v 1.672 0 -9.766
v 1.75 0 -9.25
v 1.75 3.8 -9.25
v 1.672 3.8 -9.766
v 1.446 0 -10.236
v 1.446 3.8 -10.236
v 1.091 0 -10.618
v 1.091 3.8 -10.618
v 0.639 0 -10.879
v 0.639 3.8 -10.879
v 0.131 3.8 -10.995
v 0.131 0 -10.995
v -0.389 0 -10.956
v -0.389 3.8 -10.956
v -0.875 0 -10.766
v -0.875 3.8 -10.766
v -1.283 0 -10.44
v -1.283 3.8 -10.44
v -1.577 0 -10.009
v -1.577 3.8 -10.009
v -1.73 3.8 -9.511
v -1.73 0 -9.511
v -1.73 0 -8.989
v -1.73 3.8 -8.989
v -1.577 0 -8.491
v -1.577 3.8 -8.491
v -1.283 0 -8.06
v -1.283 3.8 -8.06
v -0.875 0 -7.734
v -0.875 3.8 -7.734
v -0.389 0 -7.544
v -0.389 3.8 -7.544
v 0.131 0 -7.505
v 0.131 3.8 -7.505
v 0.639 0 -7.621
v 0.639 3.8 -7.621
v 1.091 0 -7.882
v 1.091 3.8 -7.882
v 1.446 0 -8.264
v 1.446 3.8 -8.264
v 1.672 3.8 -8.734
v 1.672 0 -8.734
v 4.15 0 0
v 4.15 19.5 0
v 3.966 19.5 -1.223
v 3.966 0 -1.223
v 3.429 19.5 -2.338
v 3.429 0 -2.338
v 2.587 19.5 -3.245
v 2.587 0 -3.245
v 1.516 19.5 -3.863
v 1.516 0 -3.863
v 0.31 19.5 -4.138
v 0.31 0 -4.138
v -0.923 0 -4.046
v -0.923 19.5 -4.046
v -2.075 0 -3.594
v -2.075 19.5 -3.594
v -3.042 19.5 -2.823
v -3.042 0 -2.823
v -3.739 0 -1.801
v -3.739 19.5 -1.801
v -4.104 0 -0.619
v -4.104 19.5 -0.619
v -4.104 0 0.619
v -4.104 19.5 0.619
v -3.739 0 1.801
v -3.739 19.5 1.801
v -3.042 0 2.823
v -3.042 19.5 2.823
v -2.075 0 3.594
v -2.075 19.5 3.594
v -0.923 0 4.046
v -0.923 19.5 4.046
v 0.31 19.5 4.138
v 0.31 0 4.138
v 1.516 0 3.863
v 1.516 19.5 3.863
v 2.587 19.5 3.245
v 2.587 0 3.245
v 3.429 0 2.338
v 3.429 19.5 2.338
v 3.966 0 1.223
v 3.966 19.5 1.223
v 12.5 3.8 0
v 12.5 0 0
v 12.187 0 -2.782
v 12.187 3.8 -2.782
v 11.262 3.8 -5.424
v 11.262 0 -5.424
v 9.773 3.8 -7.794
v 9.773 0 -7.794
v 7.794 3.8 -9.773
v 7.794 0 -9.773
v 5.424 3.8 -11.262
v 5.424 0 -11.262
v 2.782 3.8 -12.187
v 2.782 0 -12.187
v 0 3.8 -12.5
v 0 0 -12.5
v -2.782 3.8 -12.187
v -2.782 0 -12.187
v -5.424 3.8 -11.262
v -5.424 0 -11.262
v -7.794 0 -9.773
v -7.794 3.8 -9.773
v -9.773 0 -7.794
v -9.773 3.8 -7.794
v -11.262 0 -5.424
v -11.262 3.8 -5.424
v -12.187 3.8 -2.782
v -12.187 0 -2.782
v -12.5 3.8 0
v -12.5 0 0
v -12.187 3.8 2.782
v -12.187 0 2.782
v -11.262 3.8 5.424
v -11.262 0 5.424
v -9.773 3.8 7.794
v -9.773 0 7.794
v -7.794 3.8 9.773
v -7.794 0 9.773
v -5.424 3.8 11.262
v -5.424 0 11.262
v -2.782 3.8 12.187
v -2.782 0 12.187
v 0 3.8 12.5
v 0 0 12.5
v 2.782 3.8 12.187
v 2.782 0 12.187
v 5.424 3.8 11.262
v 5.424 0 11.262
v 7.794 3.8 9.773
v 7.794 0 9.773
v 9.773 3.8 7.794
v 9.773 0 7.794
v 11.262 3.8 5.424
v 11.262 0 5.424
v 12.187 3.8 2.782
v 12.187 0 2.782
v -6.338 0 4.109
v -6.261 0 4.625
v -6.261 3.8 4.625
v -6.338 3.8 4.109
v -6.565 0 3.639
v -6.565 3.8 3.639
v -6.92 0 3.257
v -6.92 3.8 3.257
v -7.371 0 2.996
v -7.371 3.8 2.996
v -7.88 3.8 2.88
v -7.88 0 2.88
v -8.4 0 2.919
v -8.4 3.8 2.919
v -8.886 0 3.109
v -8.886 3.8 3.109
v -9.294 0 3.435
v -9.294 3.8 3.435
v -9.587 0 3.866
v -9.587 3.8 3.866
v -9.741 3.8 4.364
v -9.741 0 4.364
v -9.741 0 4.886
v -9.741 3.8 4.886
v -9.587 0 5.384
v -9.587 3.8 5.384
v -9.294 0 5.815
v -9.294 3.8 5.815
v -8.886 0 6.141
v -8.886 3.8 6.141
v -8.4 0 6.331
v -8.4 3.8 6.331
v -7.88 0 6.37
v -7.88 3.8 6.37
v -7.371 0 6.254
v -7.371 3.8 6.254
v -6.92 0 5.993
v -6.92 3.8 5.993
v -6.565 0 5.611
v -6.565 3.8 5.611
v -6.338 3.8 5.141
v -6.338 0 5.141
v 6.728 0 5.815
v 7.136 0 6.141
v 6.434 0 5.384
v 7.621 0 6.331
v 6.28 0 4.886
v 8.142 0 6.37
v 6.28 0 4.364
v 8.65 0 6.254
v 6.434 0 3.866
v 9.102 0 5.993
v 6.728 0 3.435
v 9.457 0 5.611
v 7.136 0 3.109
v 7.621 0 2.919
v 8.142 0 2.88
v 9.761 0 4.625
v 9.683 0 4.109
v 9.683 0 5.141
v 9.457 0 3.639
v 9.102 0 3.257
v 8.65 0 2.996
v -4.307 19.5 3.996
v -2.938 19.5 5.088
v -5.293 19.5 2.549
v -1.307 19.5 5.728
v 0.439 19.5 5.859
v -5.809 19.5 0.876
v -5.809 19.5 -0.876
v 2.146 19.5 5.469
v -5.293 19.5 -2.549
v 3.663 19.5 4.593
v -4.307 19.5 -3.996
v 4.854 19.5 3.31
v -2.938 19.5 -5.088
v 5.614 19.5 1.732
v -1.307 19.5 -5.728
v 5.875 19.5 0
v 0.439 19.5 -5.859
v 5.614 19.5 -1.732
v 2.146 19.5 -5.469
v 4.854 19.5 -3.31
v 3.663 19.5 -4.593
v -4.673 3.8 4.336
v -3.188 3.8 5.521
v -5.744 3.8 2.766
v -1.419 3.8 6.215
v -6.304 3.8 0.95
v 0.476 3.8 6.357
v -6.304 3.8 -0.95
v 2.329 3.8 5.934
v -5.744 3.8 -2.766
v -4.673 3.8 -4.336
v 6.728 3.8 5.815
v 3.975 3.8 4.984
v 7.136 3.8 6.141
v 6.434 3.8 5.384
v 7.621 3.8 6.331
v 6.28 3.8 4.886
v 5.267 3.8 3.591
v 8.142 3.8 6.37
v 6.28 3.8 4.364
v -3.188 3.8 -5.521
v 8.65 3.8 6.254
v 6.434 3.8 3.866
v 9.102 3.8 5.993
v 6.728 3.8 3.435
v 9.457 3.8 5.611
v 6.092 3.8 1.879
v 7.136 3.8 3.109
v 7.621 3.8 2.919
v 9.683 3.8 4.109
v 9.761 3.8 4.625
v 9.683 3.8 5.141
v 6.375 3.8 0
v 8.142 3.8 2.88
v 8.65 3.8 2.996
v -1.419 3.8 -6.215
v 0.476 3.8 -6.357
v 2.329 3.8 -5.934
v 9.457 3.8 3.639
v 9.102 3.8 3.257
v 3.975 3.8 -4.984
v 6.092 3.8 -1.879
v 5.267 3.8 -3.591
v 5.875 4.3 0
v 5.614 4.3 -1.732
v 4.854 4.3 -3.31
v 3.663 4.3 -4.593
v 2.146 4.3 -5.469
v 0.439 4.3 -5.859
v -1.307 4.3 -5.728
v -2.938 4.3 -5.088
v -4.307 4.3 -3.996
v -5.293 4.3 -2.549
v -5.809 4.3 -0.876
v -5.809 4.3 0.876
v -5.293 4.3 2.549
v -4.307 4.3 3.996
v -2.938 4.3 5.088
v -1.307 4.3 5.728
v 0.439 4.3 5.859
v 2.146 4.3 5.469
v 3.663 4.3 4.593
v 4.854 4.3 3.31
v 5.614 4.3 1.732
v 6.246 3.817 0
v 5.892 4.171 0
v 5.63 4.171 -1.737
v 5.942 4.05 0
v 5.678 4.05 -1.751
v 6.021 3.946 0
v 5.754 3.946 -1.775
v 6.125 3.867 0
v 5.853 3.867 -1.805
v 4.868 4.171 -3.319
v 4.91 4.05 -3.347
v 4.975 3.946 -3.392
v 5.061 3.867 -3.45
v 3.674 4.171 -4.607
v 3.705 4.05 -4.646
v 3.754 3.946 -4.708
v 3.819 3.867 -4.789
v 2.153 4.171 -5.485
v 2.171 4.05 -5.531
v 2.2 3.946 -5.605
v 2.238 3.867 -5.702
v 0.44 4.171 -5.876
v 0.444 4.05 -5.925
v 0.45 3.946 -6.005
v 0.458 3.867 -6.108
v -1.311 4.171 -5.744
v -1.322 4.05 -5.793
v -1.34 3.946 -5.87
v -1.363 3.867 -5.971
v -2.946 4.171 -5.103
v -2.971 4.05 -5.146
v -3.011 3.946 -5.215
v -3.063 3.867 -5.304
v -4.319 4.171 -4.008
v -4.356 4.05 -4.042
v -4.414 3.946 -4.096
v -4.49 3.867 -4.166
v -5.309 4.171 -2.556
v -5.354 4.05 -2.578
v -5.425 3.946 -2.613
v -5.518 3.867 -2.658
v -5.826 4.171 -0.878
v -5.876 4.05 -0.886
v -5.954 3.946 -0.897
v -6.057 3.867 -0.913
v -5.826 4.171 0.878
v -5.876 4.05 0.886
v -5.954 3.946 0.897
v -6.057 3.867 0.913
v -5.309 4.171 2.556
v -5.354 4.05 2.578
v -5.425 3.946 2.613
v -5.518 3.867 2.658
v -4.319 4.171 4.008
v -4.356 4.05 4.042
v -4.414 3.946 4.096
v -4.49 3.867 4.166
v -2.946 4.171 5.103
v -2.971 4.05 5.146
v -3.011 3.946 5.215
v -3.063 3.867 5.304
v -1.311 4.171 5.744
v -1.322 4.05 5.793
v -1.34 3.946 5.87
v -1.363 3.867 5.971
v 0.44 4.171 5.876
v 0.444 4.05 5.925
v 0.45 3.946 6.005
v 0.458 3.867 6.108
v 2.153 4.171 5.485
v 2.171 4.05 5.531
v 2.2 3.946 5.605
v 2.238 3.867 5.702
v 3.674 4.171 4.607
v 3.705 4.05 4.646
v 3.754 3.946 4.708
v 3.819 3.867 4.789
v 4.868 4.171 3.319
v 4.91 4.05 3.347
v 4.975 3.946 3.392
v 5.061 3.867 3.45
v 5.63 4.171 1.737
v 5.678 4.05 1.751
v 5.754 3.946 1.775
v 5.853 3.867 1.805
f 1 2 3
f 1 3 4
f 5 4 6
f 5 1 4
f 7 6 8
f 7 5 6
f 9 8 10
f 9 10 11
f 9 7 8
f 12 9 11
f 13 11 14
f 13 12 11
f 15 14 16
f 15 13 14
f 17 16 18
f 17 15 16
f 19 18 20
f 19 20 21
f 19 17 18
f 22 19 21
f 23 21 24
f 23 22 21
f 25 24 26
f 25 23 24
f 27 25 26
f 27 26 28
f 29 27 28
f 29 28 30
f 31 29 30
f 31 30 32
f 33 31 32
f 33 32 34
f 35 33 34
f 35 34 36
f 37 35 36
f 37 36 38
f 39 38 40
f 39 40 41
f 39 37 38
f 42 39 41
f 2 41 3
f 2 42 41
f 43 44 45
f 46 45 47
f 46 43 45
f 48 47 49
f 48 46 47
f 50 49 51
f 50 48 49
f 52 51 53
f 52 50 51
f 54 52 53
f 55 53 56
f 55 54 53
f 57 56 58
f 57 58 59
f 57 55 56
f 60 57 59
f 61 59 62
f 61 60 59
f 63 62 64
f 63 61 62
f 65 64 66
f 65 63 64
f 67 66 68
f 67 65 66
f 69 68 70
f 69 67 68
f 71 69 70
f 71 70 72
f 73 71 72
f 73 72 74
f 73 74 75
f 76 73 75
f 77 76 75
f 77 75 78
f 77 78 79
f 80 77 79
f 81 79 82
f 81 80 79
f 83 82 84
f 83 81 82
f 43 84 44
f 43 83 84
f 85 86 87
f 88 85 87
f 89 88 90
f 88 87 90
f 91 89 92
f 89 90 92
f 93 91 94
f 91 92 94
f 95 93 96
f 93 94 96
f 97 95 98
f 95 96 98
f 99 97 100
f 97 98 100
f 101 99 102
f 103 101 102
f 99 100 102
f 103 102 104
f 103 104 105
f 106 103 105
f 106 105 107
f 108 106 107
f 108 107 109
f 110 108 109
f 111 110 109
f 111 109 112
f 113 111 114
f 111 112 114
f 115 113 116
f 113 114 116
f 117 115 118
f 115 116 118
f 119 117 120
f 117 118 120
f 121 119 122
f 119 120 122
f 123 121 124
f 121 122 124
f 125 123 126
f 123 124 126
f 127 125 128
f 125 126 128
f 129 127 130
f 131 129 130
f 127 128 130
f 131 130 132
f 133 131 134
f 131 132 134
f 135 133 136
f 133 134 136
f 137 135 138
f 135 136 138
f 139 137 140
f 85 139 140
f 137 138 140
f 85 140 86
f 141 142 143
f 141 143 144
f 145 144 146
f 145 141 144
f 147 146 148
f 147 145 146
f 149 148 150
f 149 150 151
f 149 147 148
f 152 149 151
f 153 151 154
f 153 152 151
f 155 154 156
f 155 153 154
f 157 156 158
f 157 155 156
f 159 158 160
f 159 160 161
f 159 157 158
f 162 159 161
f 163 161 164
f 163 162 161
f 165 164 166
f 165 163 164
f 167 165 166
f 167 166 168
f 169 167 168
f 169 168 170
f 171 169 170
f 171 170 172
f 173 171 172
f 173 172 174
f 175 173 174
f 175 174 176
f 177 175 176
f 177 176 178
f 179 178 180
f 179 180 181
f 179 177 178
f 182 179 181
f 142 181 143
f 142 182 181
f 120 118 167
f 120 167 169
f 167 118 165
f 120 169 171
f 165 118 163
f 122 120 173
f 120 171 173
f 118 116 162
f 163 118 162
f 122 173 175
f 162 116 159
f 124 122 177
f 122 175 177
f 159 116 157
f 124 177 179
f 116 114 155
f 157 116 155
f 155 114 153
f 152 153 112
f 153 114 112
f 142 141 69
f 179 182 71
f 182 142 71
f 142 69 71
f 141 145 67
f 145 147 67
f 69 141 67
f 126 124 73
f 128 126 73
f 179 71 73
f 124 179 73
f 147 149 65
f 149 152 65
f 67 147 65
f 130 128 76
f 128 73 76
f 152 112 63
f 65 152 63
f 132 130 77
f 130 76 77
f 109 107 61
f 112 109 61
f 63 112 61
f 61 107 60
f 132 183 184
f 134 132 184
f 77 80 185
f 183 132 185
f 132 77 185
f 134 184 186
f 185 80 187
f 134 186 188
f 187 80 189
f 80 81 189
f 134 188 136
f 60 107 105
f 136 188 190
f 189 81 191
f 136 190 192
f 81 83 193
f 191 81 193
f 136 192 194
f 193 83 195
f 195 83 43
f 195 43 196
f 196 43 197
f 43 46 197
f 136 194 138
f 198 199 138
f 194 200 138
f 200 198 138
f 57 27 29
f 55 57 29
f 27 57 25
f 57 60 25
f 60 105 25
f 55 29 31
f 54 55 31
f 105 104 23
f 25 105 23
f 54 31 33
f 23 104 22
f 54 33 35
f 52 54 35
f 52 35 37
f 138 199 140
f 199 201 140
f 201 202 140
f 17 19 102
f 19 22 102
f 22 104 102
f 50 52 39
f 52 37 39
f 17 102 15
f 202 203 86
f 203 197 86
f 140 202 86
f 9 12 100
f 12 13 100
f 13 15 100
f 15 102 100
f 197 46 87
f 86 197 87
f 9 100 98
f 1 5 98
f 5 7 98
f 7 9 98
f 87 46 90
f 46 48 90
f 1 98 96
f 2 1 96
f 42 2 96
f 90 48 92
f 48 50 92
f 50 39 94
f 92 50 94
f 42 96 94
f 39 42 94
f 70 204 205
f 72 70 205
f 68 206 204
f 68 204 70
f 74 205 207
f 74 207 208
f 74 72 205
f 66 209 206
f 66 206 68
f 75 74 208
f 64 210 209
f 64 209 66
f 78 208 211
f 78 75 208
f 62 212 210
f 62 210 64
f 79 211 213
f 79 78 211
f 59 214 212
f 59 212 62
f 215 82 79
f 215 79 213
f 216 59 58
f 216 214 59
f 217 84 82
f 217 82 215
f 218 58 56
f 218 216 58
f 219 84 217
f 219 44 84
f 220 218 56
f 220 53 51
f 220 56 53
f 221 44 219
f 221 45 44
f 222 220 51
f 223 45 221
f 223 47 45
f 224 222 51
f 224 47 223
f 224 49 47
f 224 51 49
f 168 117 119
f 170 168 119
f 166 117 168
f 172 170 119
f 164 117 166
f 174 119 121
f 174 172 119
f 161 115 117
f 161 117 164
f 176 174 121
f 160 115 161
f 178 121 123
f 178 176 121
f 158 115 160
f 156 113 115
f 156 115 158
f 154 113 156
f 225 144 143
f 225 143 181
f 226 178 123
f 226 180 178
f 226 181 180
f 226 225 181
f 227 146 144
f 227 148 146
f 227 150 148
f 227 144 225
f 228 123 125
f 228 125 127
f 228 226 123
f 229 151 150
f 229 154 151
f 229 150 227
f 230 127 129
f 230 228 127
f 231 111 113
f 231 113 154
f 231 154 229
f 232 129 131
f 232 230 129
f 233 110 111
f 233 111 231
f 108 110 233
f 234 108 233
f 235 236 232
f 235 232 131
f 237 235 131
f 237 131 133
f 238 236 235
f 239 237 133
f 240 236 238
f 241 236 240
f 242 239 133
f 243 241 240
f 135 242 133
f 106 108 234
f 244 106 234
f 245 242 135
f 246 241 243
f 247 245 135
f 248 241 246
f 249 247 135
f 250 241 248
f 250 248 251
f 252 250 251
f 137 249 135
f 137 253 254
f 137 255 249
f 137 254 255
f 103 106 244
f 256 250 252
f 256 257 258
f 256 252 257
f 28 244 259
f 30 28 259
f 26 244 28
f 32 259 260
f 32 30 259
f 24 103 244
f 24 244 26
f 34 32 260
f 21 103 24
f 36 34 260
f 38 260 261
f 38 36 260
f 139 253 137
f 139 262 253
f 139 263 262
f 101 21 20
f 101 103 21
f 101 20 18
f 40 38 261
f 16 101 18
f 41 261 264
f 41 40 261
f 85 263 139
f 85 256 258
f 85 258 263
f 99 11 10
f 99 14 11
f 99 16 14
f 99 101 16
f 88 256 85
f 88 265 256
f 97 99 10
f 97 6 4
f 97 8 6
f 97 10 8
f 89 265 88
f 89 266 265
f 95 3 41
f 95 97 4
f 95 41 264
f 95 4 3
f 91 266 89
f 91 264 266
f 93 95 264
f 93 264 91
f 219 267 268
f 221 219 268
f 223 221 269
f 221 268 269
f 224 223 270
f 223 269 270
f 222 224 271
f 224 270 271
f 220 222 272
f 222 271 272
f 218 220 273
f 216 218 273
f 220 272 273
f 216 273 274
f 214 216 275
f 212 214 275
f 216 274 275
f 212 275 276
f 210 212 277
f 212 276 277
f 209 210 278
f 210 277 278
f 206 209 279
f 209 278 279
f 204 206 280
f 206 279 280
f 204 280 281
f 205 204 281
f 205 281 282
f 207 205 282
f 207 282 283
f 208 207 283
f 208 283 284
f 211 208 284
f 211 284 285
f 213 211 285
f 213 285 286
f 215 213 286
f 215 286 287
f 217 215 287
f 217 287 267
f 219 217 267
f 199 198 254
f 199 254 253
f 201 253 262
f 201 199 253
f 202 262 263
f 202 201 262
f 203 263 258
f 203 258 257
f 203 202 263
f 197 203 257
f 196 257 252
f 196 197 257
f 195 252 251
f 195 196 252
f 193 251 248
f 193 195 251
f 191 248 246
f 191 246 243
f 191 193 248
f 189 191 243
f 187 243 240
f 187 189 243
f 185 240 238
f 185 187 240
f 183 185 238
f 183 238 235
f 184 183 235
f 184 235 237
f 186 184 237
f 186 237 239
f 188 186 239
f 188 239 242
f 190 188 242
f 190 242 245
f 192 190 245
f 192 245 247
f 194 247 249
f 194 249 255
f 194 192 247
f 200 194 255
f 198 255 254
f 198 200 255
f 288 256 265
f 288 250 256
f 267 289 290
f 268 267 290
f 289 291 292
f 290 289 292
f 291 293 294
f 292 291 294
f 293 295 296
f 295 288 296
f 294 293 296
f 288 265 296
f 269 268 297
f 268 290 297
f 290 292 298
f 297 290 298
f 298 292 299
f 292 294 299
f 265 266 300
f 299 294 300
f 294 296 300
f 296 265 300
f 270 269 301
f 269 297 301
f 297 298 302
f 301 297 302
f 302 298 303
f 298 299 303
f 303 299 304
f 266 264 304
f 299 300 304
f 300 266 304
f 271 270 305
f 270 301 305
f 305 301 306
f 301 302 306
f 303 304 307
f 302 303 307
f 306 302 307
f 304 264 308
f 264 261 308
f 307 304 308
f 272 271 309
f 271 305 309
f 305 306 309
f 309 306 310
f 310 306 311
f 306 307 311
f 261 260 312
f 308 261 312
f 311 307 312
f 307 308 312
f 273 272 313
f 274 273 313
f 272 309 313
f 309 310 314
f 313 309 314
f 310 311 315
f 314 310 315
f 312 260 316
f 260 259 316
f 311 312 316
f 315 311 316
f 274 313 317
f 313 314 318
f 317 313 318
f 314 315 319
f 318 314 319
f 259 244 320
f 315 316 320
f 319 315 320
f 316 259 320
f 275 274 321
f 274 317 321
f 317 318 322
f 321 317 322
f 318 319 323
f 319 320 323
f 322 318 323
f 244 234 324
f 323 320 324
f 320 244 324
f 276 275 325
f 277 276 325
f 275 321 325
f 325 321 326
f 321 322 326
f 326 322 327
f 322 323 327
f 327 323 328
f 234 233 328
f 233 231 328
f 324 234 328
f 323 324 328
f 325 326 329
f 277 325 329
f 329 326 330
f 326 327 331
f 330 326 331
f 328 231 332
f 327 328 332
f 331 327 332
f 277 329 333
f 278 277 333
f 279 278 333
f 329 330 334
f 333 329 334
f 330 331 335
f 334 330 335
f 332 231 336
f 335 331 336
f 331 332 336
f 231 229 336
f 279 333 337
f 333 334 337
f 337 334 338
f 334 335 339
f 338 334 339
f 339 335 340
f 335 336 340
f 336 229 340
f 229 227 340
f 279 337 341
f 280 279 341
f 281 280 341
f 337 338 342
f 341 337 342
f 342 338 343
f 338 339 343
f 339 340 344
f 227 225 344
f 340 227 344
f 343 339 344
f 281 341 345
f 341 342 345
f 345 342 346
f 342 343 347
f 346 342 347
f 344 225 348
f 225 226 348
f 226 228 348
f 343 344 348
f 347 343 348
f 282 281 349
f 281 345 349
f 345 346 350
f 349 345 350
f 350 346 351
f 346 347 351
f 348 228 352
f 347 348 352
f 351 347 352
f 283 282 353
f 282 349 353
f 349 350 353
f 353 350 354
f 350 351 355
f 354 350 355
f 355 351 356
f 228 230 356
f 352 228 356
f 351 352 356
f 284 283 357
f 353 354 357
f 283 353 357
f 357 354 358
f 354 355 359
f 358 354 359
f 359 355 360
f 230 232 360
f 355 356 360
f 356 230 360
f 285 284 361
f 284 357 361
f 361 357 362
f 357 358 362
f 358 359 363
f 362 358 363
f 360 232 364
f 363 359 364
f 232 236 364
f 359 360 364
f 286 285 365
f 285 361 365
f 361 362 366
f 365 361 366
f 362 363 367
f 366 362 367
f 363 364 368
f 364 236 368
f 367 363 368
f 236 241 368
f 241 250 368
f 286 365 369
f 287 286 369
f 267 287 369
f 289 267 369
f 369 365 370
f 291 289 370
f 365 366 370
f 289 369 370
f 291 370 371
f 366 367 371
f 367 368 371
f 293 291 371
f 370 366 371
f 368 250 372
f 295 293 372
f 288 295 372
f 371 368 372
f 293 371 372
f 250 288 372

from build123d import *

# Parameters (mm, degrees)
ESBO_O1_R                = 12.5
ESBO_O1_R_2              = 1.75
ESBO_O1_R_3              = 5.875
RESSALTO_EXTRUS_O1_DEPTH = 3.8
ESBO_O1_3_R              = 5.875
ESBO_O1_3_R_2            = 4.15
RESSALTO_EXTRUS_O2_DEPTH = 19.5
FILETE1_R                = 0.5


with BuildPart() as part:
    # Esboço1 → Ressalto-extrusão1 (new body)
    with BuildSketch(Plane(origin=(0, 0, 0), x_dir=(1, 0, 0), z_dir=(0, 1, 0))):
        Circle(ESBO_O1_R)
        with Locations((-8.010734985, -4.625)):
            Circle(ESBO_O1_R_2, mode=Mode.SUBTRACT)
        with Locations((8.010734985, -4.625)):
            Circle(ESBO_O1_R_2, mode=Mode.SUBTRACT)
        Circle(ESBO_O1_R_3, mode=Mode.SUBTRACT)
        with Locations((0, 9.25)):
            Circle(ESBO_O1_R_2, mode=Mode.SUBTRACT)
    extrude(amount=RESSALTO_EXTRUS_O1_DEPTH)

    # Esboço1<3> → Ressalto-extrusão2 (add)
    with BuildSketch(Plane(origin=(0, 0, 0), x_dir=(1, 0, 0), z_dir=(0, 1, 0))):
        Circle(ESBO_O1_3_R)
        Circle(ESBO_O1_3_R_2, mode=Mode.SUBTRACT)
    extrude(amount=RESSALTO_EXTRUS_O2_DEPTH)

    # Filete1
    filete1_edges = [part.edges().sort_by_distance(p)[0] for p in [
        (-5.875, 3.8, 0),
    ]]
    fillet(filete1_edges, radius=FILETE1_R)


solid = part.part
